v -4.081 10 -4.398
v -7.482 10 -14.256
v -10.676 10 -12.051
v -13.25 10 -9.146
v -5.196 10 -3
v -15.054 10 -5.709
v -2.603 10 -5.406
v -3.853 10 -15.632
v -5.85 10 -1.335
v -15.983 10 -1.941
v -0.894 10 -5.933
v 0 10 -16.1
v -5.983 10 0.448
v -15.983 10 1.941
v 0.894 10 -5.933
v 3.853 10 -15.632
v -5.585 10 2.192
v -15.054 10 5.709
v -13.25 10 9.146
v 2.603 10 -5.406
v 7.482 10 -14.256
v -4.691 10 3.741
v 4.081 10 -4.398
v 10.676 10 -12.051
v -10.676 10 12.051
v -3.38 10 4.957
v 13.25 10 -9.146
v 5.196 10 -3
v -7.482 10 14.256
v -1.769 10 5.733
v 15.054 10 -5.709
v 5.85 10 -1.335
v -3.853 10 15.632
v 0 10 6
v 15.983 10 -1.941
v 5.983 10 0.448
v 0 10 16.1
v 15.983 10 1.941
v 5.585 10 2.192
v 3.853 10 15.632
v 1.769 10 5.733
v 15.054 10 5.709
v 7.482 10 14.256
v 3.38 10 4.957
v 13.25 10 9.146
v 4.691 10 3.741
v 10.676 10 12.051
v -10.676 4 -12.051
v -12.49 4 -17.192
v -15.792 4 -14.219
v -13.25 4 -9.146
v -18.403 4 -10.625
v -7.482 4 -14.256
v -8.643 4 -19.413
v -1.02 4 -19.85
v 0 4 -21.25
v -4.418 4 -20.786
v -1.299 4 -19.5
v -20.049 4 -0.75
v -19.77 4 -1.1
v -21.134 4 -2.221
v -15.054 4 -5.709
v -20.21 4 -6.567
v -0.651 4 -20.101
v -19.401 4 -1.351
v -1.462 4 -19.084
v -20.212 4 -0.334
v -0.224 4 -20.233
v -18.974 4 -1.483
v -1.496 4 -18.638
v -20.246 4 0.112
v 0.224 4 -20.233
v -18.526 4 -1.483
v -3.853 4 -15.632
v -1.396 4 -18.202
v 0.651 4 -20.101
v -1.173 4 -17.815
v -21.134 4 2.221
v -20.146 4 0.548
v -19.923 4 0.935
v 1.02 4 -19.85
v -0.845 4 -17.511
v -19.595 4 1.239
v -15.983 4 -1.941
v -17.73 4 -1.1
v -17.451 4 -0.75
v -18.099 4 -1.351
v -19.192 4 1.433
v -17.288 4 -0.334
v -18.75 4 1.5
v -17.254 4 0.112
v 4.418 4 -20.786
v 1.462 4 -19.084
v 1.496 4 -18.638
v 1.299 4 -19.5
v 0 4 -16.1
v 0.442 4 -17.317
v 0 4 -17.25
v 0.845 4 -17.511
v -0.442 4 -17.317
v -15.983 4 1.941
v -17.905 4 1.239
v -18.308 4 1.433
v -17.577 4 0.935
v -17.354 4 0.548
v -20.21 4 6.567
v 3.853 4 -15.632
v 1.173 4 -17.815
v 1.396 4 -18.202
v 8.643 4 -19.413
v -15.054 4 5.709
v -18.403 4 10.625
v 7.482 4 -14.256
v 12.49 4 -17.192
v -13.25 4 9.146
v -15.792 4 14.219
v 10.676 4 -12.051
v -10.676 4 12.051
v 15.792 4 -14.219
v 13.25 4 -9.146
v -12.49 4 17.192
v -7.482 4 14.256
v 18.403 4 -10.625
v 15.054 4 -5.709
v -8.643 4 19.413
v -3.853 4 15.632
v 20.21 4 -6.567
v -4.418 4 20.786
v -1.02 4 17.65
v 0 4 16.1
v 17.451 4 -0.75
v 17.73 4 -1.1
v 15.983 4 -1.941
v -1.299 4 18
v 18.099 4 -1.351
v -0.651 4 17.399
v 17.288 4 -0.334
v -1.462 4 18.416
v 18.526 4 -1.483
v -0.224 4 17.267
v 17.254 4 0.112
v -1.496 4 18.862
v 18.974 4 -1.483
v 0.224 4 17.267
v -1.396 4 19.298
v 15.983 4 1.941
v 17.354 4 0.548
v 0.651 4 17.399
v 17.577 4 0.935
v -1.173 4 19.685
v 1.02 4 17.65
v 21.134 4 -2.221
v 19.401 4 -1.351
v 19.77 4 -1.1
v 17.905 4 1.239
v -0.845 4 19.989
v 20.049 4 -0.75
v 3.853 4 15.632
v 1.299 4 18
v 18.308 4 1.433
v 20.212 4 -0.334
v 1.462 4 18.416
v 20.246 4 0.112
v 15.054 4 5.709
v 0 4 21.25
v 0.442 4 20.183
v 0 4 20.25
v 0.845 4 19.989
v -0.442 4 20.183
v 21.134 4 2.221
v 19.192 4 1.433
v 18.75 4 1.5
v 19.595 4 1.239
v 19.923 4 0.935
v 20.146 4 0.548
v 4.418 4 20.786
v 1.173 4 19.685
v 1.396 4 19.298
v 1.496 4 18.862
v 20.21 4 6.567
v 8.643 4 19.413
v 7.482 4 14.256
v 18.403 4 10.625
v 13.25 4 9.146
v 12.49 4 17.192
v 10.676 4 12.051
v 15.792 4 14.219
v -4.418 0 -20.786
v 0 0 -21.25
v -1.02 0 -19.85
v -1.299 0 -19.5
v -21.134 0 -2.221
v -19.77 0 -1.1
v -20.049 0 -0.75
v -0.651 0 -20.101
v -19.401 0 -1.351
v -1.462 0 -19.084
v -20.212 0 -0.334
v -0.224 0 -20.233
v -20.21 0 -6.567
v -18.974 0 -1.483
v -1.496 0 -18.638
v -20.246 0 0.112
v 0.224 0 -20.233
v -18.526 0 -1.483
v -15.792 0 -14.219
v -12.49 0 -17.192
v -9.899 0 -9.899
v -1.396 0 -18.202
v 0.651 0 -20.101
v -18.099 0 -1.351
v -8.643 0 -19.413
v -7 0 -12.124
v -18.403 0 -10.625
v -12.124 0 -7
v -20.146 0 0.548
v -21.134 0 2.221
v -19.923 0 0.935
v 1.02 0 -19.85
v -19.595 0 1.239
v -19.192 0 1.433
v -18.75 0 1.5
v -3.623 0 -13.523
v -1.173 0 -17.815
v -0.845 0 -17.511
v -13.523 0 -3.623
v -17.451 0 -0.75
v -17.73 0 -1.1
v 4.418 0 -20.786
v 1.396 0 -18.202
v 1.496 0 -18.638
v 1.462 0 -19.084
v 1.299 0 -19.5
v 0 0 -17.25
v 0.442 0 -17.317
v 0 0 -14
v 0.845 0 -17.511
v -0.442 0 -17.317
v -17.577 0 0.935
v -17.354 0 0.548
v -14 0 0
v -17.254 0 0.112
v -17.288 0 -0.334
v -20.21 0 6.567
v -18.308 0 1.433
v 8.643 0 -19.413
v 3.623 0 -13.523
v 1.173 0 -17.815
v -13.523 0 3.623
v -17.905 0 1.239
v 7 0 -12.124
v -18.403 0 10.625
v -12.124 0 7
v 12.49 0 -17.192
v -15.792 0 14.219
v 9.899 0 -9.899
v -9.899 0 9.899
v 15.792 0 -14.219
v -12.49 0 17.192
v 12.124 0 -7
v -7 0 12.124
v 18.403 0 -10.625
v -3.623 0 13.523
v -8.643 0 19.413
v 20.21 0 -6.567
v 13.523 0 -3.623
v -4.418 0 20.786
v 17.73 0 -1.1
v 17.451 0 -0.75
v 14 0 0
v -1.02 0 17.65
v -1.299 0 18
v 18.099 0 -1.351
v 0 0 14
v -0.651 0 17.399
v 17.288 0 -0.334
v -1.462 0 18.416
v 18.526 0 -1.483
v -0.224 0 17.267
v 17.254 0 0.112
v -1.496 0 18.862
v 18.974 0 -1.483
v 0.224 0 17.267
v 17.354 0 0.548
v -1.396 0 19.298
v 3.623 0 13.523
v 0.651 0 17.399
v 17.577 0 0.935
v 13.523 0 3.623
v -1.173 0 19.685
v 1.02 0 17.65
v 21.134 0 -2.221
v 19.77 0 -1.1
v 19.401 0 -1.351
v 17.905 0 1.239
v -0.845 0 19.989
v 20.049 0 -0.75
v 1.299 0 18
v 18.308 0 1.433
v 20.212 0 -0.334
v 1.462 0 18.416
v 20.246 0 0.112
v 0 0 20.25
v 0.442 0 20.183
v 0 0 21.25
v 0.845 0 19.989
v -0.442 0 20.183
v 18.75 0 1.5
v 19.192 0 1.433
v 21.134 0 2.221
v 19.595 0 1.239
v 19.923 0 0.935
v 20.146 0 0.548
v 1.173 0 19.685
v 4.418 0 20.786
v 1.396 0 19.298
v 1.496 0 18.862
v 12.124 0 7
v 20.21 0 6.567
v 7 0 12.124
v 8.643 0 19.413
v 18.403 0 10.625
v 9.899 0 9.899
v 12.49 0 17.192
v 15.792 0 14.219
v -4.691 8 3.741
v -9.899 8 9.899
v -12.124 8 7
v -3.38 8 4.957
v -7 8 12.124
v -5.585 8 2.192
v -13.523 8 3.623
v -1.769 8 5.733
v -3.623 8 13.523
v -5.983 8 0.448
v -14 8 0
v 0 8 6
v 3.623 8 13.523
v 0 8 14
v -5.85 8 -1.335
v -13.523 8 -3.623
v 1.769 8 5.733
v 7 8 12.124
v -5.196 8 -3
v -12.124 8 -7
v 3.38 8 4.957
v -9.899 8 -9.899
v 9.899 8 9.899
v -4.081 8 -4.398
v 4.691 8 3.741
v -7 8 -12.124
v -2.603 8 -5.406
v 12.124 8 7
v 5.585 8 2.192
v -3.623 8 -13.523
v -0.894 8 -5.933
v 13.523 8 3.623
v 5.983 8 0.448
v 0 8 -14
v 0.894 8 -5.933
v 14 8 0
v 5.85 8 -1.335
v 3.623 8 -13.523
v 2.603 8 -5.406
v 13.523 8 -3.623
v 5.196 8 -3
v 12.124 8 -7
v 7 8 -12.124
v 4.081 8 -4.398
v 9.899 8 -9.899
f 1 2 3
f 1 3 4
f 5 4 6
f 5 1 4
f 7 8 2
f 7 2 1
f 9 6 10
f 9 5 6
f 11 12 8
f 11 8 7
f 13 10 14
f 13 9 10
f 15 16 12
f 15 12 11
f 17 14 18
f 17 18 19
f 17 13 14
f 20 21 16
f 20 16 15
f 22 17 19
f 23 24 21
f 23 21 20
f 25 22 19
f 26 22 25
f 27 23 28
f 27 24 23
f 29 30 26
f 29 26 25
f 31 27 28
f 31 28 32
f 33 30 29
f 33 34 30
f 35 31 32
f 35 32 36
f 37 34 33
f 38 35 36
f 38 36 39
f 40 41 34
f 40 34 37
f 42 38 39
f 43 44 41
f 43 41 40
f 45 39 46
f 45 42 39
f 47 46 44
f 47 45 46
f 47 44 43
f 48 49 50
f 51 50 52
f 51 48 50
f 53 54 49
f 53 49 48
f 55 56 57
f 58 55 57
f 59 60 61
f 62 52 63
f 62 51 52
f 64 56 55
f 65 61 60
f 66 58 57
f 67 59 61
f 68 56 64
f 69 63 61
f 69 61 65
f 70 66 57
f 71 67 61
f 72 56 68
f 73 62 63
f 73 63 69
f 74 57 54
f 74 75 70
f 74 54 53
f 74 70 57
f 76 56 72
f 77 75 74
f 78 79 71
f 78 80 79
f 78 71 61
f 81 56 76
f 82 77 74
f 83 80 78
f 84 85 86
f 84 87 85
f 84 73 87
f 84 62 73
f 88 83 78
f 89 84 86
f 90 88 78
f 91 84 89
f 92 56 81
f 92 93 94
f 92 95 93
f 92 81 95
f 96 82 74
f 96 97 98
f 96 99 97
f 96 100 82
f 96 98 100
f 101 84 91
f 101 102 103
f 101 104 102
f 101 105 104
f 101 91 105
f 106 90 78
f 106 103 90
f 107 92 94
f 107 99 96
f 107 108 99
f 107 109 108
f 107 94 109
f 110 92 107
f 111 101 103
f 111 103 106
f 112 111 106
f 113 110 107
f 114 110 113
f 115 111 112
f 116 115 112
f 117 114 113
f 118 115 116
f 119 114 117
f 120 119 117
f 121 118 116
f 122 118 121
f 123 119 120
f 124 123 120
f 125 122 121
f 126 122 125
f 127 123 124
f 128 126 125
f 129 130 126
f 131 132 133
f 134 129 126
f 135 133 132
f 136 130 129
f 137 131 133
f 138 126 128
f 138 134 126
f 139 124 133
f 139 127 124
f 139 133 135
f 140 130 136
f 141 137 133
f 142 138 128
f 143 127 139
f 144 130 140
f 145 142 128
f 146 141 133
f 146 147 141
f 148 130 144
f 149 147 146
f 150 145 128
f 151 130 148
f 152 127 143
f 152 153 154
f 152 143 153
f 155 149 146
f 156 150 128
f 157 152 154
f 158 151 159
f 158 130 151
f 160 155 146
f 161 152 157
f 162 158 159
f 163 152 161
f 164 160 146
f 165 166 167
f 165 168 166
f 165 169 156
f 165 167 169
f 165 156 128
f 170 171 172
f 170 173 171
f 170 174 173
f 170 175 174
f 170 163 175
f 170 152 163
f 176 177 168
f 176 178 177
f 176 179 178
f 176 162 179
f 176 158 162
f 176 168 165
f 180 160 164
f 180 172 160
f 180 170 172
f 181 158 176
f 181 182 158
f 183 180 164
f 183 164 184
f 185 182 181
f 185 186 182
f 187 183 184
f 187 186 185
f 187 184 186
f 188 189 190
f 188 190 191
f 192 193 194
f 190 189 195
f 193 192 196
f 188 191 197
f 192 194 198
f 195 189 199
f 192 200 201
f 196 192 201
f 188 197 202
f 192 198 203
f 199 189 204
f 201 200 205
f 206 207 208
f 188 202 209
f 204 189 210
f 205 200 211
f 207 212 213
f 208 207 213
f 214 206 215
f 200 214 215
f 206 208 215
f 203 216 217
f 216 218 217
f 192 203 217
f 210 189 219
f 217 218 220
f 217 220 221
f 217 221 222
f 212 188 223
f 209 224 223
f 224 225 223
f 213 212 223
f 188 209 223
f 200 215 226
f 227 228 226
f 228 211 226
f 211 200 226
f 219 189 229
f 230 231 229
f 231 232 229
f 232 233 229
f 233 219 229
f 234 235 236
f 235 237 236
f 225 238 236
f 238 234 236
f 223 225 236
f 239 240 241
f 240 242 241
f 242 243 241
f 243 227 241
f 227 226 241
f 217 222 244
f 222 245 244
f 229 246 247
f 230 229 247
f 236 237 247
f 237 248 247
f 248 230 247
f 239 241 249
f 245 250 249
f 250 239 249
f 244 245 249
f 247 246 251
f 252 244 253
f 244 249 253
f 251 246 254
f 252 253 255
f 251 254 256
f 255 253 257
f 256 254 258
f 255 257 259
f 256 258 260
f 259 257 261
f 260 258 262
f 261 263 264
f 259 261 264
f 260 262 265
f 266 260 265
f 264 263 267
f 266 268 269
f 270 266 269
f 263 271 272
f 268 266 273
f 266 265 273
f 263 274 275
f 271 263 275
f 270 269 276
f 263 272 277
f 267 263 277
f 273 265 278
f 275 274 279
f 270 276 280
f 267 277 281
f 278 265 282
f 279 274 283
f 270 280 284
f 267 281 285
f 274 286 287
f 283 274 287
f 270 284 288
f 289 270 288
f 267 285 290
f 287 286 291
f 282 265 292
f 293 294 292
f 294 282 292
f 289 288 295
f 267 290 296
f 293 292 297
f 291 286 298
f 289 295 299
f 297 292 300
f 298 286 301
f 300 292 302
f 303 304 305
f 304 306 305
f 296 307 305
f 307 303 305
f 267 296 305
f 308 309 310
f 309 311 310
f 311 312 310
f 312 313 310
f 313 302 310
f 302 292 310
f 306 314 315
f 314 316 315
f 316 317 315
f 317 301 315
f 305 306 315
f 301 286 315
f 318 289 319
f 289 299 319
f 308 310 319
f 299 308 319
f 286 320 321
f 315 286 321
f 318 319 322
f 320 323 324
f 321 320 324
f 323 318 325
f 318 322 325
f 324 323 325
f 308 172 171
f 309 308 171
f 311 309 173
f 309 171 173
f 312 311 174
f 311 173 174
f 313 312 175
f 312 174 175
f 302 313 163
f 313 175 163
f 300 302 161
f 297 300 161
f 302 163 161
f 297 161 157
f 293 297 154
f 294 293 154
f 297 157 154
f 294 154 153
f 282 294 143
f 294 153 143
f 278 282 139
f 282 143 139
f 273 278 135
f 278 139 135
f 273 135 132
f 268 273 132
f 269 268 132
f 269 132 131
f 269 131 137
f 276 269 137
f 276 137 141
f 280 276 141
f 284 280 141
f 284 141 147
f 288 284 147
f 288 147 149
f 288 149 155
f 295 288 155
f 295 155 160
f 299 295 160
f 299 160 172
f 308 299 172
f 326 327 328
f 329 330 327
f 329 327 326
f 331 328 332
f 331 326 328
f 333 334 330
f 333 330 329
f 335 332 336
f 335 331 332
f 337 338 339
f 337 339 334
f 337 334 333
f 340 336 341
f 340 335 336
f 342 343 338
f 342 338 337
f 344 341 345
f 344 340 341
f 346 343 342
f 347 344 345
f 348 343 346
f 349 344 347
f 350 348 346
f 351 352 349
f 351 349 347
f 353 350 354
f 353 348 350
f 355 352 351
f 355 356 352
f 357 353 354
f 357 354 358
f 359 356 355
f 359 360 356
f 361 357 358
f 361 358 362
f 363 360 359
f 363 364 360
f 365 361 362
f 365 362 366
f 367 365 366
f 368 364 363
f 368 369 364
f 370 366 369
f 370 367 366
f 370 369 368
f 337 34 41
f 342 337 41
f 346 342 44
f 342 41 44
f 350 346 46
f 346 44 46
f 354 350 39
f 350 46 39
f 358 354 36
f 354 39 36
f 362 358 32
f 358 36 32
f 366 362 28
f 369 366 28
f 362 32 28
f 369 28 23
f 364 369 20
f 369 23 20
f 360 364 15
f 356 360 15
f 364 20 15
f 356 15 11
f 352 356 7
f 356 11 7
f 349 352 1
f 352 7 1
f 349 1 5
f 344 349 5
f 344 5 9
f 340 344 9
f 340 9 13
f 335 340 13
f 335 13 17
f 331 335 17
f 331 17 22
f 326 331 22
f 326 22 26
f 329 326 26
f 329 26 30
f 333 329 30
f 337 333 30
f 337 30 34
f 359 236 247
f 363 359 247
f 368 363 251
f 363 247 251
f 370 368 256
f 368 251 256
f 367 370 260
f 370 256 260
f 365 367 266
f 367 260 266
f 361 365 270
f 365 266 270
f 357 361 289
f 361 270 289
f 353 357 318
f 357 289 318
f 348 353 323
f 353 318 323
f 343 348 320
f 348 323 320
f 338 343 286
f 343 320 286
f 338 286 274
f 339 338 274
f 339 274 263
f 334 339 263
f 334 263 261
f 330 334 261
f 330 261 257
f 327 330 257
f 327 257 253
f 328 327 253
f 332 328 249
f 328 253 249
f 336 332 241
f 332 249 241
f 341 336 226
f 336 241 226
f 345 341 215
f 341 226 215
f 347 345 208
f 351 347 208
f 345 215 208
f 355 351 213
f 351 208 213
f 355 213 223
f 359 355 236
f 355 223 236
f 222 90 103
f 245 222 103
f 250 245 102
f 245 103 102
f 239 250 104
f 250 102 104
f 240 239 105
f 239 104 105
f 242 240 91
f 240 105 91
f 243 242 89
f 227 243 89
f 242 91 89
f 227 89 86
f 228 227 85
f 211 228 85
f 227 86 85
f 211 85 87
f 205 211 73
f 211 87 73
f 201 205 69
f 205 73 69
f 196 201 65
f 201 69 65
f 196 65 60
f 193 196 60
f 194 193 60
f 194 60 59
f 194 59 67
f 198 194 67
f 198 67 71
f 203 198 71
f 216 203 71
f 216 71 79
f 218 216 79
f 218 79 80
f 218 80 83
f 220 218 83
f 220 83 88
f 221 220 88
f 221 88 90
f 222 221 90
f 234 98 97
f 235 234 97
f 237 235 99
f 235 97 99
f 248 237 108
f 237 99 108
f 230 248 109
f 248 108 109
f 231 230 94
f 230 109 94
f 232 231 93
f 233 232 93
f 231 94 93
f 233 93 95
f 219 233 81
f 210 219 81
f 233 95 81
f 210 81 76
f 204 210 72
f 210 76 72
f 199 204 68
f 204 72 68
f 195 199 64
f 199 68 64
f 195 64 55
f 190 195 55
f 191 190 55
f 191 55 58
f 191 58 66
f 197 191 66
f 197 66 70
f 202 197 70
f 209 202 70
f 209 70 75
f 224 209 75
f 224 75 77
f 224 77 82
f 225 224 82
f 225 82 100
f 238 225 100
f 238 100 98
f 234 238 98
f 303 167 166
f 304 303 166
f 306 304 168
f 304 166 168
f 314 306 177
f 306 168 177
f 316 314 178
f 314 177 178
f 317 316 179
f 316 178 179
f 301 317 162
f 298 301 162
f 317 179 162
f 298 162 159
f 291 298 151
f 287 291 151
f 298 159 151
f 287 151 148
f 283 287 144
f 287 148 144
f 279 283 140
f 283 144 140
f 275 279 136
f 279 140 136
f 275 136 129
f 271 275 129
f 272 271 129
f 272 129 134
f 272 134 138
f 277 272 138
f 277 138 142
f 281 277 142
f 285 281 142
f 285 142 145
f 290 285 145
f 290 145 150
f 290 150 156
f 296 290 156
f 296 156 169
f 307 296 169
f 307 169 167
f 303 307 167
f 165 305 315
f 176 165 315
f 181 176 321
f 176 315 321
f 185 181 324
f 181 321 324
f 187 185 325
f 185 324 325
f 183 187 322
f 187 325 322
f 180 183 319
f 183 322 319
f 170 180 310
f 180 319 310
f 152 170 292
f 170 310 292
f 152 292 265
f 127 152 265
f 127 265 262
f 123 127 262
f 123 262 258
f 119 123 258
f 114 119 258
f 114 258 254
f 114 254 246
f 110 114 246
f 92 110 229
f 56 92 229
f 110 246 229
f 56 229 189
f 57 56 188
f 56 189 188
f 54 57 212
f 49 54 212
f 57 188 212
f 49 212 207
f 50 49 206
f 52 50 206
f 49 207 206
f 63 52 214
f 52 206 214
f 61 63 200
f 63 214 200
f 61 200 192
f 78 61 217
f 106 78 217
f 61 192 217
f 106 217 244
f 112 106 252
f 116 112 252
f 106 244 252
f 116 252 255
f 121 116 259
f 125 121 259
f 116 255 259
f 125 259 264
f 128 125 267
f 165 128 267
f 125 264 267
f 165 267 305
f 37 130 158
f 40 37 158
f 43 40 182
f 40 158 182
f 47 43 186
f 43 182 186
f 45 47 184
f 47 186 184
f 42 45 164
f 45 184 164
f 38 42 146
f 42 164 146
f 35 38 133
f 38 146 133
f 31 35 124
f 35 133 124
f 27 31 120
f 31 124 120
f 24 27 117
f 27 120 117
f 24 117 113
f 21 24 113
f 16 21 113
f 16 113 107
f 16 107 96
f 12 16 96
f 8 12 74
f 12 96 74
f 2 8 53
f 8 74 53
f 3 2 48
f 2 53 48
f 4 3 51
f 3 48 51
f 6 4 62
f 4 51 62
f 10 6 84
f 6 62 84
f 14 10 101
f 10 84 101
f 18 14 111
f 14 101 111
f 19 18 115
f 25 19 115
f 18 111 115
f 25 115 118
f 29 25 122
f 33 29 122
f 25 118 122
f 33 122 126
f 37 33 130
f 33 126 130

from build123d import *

# Parameters (mm, degrees)
SKETCH_1_R          = 21.25
EXTRUDE_1_DEPTH     = 4
SKETCH_2_R          = 16.1
EXTRUDE_2_DEPTH     = 6
SKETCH_3_R          = 14
CUT_EXTRUDE_3_DEPTH = 8
SKETCH_4_R          = 6
CUT_EXTRUDE_4_DEPTH = 32.672148648
SKETCH_5_R          = 1.5
CUT_EXTRUDE_5_DEPTH = 10


with BuildPart() as part:
    # Эскиз1 → Вытянуть1 (new body)
    with BuildSketch(Plane(origin=(0, 0, 0), x_dir=(1, 0, 0), z_dir=(0, 1, 0))):
        with Locations(Location((0, 0, 0), (0, 0, 270))):
            Circle(SKETCH_1_R)
    extrude(amount=EXTRUDE_1_DEPTH)

    # Эскиз2 → Вытянуть2 (add)
    with BuildSketch(Plane(origin=(0, 4, 0), x_dir=(-1, 0, 0), z_dir=(0, 1, 0))):
        with Locations(Location((0, 0, 0), (0, 0, 90))):
            Circle(SKETCH_2_R)
    extrude(amount=EXTRUDE_2_DEPTH)

    # Эскиз3 → Вытянуть3 (cut)
    with BuildSketch(Plane.XZ):
        with Locations(Location((0, 0, 0), (0, 0, 270))):
            Circle(SKETCH_3_R)
    extrude(amount=-CUT_EXTRUDE_3_DEPTH, mode=Mode.SUBTRACT)

    # Эскиз4 → Вытянуть4 (cut, through all)
    with BuildSketch(Plane(origin=(0, 10, 0), x_dir=(1, 0, 0), z_dir=(0, 1, 0))):
        with Locations(Location((0, 0, 0), (0, 0, 270))):
            Circle(SKETCH_4_R)
    extrude(amount=-CUT_EXTRUDE_4_DEPTH, mode=Mode.SUBTRACT)

    # Эскиз5 → Вытянуть5 (cut)
    with BuildSketch(Plane(origin=(0, 4, 0), x_dir=(1, 0, 0), z_dir=(0, 1, 0))):
        with Locations(Location((0, 18.75, 0), (0, 0, 270))):
            Circle(SKETCH_5_R)
        with Locations(Location((18.75, 0, 0), (0, 0, 270))):
            Circle(SKETCH_5_R)
        with Locations(Location((0, -18.75, 0), (0, 0, 270))):
            Circle(SKETCH_5_R)
        with Locations(Location((-18.75, 0, 0), (0, 0, 270))):
            Circle(SKETCH_5_R)
    extrude(amount=-CUT_EXTRUDE_5_DEPTH, mode=Mode.SUBTRACT)


solid = part.part
